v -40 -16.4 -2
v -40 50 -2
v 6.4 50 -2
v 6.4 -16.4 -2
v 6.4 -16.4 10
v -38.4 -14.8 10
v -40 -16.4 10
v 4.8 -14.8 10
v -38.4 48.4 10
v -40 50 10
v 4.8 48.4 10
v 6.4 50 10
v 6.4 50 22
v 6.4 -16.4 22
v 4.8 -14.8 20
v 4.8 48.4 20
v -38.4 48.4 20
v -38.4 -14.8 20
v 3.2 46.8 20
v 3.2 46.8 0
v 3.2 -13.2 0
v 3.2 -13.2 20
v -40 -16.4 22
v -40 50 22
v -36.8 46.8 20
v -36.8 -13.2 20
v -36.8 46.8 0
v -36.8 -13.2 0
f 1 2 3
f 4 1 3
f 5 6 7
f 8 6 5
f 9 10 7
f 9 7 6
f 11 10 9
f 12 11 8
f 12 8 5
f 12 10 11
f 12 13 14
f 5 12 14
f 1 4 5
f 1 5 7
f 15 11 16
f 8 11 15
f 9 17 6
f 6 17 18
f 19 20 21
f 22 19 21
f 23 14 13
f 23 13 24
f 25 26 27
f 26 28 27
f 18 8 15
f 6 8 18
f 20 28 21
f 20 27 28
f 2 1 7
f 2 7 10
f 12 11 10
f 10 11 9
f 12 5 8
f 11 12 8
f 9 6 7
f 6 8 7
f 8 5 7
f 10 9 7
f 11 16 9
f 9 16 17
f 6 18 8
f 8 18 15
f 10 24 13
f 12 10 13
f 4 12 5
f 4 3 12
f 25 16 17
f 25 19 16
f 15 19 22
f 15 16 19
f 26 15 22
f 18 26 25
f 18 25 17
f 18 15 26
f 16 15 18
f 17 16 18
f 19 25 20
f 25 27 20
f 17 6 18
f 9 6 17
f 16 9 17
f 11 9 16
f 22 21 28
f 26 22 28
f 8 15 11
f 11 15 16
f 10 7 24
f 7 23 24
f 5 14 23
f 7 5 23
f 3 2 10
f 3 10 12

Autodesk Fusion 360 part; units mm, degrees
sketch "Sketch1" plane through (0, 0, 0) normal (0, 0, 1) x (1, 0, 0)
  line L0 (-40, 50) -> (6.4, 50)
  line L1 (6.4, 50) -> (6.4, -16.4)
  line L2 (6.4, -16.4) -> (-40, -16.4)
  line L3 (-40, -16.4) -> (-40, 50)
  line L4 (-36.8, 46.8) -> (3.2, 46.8)
  line L5 (3.2, 46.8) -> (3.2, -13.2)
  line L6 (3.2, -13.2) -> (-36.8, -13.2)
  line L7 (-36.8, -13.2) -> (-36.8, 46.8)
  dimension "d1" = 46.4
  dimension "d2" = 66.4
  dimension "d3" = 40
  dimension "d4" = 60
  dimension "d5" = 3.2
  dimension "d6" = 3.2
extrude "Extrude1" add sketch "Sketch1" against normal blind 2 contours L0 L1 L2 L3 | L4 L5 L6 L7 makes body 1
extrude "Extrude2" add sketch "Sketch1" along normal blind 10 bodies 1
sketch "Sketch2" plane through (0, 0, 10) normal (0, 0, 1) x (-1, 0, 0)
  line L0 (-3.2, 13.2) -> (36.8, 13.2)
  line L1 (36.8, 13.2) -> (36.8, -46.8)
  line L2 (36.8, -46.8) -> (-3.2, -46.8)
  line L3 (-3.2, -46.8) -> (-3.2, 13.2)
  line L4 (40, 16.4) -> (-6.4, 16.4)
  line L5 (-6.4, 16.4) -> (-6.4, -50)
  line L6 (-6.4, -50) -> (40, -50)
  line L7 (40, -50) -> (40, 16.4)
  line L8 (36.8, -46.8) -> (-3.2, -46.8)
  line L9 (-3.2, -46.8) -> (-3.2, 13.2)
  line L10 (-3.2, 13.2) -> (36.8, 13.2)
  line L11 (36.8, 13.2) -> (36.8, -46.8)
  line L12 (38.4, -48.4) -> (-4.8, -48.4)
  line L13 (-4.8, -48.4) -> (-4.8, 14.8)
  line L14 (-4.8, 14.8) -> (38.4, 14.8)
  line L15 (38.4, 14.8) -> (38.4, -48.4)
  dimension "d11" = 43.2
  dimension "d12" = 63.2
  dimension "d13" = 1.6
  dimension "d14" = 1.6
extrude "Extrude3" add sketch "Sketch2" along normal blind 10 contours L12 L13 L14 L15 bodies 1
sketch "Sketch3" plane through (0, 0, 20) normal (0, 0, 1) x (-1, 0, 0)
  line L0 (-3.2, 13.2) -> (36.8, 13.2)
  line L1 (36.8, 13.2) -> (36.8, -46.8)
  line L2 (36.8, -46.8) -> (-3.2, -46.8)
  line L3 (-3.2, -46.8) -> (-3.2, 13.2)
  line L4 (38.4, 14.8) -> (-4.8, 14.8)
  line L5 (-4.8, 14.8) -> (-4.8, -48.4)
  line L6 (-4.8, -48.4) -> (38.4, -48.4)
  line L7 (38.4, -48.4) -> (38.4, 14.8)
  line L8 (40, -50) -> (-6.4, -50)
  line L9 (-6.4, -50) -> (-6.4, 16.4)
  line L10 (-6.4, 16.4) -> (40, 16.4)
  line L11 (40, 16.4) -> (40, -50)
  line L12 (38.4, -48.4) -> (-4.8, -48.4)
  line L13 (-4.8, -48.4) -> (-4.8, 14.8)
  line L14 (-4.8, 14.8) -> (38.4, 14.8)
  line L15 (38.4, 14.8) -> (38.4, -48.4)
  dimension "d17" = 46.4
  dimension "d18" = 66.4
extrude "Extrude1'" add sketch "Sketch3" against normal blind 10 separate body contours L8 L9 L10 L11 makes body 2 in component "Component"
sketch "Sketch4" plane through (0, 0, 20) normal (0, 0, 1) x (-1, 0, 0)
  line L0 (-4.8, 14.8) -> (38.4, 14.8)
  line L1 (38.4, 14.8) -> (38.4, -48.4)
  line L2 (38.4, -48.4) -> (-4.8, -48.4)
  line L3 (-4.8, -48.4) -> (-4.8, 14.8)
  line L4 (40, 16.4) -> (-6.4, 16.4)
  line L5 (-6.4, 16.4) -> (-6.4, -50)
  line L6 (-6.4, -50) -> (40, -50)
  line L7 (40, -50) -> (40, 16.4)
  line L8 (40, -50) -> (-6.4, -50)
  line L9 (-6.4, -50) -> (-6.4, 16.4)
  line L10 (-6.4, 16.4) -> (40, 16.4)
  line L11 (40, 16.4) -> (40, -50)
copy_body "Body->Comp1" bodies 1 removing the originals makes body 3 in component "Component'"
sketch "Sketch5" plane through (0, 0, 20) normal (0, 0, 1) x (-1, 0, 0)
  line L0 (-4.8, 14.8) -> (38.4, 14.8)
  line L1 (38.4, 14.8) -> (38.4, -48.4)
  line L2 (38.4, -48.4) -> (-4.8, -48.4)
  line L3 (-4.8, -48.4) -> (-4.8, 14.8)
  line L4 (40, 16.4) -> (-6.4, 16.4)
  line L5 (-6.4, 16.4) -> (-6.4, -50)
  line L6 (-6.4, -50) -> (40, -50)
  line L7 (40, -50) -> (40, 16.4)
  line L8 (40, -50) -> (-6.4, -50)
  line L9 (-6.4, -50) -> (-6.4, 16.4)
  line L10 (-6.4, 16.4) -> (40, 16.4)
  line L11 (40, 16.4) -> (40, -50)
extrude "Extrude2'" add sketch "Sketch5" along normal blind 2 contours L0 L1 L2 L3 | L4 L5 L6 L7 L8 L9 L10 L11 bodies 2 in component "Component"
component "Component" placed x (1, 0, 0) y (0, 1, 0) z (0, 0, 1) at (0, 0, 0)
component "Component'" placed x (1, 0, 0) y (0, 1, 0) z (0, 0, 1) at (0, 0, 0)
